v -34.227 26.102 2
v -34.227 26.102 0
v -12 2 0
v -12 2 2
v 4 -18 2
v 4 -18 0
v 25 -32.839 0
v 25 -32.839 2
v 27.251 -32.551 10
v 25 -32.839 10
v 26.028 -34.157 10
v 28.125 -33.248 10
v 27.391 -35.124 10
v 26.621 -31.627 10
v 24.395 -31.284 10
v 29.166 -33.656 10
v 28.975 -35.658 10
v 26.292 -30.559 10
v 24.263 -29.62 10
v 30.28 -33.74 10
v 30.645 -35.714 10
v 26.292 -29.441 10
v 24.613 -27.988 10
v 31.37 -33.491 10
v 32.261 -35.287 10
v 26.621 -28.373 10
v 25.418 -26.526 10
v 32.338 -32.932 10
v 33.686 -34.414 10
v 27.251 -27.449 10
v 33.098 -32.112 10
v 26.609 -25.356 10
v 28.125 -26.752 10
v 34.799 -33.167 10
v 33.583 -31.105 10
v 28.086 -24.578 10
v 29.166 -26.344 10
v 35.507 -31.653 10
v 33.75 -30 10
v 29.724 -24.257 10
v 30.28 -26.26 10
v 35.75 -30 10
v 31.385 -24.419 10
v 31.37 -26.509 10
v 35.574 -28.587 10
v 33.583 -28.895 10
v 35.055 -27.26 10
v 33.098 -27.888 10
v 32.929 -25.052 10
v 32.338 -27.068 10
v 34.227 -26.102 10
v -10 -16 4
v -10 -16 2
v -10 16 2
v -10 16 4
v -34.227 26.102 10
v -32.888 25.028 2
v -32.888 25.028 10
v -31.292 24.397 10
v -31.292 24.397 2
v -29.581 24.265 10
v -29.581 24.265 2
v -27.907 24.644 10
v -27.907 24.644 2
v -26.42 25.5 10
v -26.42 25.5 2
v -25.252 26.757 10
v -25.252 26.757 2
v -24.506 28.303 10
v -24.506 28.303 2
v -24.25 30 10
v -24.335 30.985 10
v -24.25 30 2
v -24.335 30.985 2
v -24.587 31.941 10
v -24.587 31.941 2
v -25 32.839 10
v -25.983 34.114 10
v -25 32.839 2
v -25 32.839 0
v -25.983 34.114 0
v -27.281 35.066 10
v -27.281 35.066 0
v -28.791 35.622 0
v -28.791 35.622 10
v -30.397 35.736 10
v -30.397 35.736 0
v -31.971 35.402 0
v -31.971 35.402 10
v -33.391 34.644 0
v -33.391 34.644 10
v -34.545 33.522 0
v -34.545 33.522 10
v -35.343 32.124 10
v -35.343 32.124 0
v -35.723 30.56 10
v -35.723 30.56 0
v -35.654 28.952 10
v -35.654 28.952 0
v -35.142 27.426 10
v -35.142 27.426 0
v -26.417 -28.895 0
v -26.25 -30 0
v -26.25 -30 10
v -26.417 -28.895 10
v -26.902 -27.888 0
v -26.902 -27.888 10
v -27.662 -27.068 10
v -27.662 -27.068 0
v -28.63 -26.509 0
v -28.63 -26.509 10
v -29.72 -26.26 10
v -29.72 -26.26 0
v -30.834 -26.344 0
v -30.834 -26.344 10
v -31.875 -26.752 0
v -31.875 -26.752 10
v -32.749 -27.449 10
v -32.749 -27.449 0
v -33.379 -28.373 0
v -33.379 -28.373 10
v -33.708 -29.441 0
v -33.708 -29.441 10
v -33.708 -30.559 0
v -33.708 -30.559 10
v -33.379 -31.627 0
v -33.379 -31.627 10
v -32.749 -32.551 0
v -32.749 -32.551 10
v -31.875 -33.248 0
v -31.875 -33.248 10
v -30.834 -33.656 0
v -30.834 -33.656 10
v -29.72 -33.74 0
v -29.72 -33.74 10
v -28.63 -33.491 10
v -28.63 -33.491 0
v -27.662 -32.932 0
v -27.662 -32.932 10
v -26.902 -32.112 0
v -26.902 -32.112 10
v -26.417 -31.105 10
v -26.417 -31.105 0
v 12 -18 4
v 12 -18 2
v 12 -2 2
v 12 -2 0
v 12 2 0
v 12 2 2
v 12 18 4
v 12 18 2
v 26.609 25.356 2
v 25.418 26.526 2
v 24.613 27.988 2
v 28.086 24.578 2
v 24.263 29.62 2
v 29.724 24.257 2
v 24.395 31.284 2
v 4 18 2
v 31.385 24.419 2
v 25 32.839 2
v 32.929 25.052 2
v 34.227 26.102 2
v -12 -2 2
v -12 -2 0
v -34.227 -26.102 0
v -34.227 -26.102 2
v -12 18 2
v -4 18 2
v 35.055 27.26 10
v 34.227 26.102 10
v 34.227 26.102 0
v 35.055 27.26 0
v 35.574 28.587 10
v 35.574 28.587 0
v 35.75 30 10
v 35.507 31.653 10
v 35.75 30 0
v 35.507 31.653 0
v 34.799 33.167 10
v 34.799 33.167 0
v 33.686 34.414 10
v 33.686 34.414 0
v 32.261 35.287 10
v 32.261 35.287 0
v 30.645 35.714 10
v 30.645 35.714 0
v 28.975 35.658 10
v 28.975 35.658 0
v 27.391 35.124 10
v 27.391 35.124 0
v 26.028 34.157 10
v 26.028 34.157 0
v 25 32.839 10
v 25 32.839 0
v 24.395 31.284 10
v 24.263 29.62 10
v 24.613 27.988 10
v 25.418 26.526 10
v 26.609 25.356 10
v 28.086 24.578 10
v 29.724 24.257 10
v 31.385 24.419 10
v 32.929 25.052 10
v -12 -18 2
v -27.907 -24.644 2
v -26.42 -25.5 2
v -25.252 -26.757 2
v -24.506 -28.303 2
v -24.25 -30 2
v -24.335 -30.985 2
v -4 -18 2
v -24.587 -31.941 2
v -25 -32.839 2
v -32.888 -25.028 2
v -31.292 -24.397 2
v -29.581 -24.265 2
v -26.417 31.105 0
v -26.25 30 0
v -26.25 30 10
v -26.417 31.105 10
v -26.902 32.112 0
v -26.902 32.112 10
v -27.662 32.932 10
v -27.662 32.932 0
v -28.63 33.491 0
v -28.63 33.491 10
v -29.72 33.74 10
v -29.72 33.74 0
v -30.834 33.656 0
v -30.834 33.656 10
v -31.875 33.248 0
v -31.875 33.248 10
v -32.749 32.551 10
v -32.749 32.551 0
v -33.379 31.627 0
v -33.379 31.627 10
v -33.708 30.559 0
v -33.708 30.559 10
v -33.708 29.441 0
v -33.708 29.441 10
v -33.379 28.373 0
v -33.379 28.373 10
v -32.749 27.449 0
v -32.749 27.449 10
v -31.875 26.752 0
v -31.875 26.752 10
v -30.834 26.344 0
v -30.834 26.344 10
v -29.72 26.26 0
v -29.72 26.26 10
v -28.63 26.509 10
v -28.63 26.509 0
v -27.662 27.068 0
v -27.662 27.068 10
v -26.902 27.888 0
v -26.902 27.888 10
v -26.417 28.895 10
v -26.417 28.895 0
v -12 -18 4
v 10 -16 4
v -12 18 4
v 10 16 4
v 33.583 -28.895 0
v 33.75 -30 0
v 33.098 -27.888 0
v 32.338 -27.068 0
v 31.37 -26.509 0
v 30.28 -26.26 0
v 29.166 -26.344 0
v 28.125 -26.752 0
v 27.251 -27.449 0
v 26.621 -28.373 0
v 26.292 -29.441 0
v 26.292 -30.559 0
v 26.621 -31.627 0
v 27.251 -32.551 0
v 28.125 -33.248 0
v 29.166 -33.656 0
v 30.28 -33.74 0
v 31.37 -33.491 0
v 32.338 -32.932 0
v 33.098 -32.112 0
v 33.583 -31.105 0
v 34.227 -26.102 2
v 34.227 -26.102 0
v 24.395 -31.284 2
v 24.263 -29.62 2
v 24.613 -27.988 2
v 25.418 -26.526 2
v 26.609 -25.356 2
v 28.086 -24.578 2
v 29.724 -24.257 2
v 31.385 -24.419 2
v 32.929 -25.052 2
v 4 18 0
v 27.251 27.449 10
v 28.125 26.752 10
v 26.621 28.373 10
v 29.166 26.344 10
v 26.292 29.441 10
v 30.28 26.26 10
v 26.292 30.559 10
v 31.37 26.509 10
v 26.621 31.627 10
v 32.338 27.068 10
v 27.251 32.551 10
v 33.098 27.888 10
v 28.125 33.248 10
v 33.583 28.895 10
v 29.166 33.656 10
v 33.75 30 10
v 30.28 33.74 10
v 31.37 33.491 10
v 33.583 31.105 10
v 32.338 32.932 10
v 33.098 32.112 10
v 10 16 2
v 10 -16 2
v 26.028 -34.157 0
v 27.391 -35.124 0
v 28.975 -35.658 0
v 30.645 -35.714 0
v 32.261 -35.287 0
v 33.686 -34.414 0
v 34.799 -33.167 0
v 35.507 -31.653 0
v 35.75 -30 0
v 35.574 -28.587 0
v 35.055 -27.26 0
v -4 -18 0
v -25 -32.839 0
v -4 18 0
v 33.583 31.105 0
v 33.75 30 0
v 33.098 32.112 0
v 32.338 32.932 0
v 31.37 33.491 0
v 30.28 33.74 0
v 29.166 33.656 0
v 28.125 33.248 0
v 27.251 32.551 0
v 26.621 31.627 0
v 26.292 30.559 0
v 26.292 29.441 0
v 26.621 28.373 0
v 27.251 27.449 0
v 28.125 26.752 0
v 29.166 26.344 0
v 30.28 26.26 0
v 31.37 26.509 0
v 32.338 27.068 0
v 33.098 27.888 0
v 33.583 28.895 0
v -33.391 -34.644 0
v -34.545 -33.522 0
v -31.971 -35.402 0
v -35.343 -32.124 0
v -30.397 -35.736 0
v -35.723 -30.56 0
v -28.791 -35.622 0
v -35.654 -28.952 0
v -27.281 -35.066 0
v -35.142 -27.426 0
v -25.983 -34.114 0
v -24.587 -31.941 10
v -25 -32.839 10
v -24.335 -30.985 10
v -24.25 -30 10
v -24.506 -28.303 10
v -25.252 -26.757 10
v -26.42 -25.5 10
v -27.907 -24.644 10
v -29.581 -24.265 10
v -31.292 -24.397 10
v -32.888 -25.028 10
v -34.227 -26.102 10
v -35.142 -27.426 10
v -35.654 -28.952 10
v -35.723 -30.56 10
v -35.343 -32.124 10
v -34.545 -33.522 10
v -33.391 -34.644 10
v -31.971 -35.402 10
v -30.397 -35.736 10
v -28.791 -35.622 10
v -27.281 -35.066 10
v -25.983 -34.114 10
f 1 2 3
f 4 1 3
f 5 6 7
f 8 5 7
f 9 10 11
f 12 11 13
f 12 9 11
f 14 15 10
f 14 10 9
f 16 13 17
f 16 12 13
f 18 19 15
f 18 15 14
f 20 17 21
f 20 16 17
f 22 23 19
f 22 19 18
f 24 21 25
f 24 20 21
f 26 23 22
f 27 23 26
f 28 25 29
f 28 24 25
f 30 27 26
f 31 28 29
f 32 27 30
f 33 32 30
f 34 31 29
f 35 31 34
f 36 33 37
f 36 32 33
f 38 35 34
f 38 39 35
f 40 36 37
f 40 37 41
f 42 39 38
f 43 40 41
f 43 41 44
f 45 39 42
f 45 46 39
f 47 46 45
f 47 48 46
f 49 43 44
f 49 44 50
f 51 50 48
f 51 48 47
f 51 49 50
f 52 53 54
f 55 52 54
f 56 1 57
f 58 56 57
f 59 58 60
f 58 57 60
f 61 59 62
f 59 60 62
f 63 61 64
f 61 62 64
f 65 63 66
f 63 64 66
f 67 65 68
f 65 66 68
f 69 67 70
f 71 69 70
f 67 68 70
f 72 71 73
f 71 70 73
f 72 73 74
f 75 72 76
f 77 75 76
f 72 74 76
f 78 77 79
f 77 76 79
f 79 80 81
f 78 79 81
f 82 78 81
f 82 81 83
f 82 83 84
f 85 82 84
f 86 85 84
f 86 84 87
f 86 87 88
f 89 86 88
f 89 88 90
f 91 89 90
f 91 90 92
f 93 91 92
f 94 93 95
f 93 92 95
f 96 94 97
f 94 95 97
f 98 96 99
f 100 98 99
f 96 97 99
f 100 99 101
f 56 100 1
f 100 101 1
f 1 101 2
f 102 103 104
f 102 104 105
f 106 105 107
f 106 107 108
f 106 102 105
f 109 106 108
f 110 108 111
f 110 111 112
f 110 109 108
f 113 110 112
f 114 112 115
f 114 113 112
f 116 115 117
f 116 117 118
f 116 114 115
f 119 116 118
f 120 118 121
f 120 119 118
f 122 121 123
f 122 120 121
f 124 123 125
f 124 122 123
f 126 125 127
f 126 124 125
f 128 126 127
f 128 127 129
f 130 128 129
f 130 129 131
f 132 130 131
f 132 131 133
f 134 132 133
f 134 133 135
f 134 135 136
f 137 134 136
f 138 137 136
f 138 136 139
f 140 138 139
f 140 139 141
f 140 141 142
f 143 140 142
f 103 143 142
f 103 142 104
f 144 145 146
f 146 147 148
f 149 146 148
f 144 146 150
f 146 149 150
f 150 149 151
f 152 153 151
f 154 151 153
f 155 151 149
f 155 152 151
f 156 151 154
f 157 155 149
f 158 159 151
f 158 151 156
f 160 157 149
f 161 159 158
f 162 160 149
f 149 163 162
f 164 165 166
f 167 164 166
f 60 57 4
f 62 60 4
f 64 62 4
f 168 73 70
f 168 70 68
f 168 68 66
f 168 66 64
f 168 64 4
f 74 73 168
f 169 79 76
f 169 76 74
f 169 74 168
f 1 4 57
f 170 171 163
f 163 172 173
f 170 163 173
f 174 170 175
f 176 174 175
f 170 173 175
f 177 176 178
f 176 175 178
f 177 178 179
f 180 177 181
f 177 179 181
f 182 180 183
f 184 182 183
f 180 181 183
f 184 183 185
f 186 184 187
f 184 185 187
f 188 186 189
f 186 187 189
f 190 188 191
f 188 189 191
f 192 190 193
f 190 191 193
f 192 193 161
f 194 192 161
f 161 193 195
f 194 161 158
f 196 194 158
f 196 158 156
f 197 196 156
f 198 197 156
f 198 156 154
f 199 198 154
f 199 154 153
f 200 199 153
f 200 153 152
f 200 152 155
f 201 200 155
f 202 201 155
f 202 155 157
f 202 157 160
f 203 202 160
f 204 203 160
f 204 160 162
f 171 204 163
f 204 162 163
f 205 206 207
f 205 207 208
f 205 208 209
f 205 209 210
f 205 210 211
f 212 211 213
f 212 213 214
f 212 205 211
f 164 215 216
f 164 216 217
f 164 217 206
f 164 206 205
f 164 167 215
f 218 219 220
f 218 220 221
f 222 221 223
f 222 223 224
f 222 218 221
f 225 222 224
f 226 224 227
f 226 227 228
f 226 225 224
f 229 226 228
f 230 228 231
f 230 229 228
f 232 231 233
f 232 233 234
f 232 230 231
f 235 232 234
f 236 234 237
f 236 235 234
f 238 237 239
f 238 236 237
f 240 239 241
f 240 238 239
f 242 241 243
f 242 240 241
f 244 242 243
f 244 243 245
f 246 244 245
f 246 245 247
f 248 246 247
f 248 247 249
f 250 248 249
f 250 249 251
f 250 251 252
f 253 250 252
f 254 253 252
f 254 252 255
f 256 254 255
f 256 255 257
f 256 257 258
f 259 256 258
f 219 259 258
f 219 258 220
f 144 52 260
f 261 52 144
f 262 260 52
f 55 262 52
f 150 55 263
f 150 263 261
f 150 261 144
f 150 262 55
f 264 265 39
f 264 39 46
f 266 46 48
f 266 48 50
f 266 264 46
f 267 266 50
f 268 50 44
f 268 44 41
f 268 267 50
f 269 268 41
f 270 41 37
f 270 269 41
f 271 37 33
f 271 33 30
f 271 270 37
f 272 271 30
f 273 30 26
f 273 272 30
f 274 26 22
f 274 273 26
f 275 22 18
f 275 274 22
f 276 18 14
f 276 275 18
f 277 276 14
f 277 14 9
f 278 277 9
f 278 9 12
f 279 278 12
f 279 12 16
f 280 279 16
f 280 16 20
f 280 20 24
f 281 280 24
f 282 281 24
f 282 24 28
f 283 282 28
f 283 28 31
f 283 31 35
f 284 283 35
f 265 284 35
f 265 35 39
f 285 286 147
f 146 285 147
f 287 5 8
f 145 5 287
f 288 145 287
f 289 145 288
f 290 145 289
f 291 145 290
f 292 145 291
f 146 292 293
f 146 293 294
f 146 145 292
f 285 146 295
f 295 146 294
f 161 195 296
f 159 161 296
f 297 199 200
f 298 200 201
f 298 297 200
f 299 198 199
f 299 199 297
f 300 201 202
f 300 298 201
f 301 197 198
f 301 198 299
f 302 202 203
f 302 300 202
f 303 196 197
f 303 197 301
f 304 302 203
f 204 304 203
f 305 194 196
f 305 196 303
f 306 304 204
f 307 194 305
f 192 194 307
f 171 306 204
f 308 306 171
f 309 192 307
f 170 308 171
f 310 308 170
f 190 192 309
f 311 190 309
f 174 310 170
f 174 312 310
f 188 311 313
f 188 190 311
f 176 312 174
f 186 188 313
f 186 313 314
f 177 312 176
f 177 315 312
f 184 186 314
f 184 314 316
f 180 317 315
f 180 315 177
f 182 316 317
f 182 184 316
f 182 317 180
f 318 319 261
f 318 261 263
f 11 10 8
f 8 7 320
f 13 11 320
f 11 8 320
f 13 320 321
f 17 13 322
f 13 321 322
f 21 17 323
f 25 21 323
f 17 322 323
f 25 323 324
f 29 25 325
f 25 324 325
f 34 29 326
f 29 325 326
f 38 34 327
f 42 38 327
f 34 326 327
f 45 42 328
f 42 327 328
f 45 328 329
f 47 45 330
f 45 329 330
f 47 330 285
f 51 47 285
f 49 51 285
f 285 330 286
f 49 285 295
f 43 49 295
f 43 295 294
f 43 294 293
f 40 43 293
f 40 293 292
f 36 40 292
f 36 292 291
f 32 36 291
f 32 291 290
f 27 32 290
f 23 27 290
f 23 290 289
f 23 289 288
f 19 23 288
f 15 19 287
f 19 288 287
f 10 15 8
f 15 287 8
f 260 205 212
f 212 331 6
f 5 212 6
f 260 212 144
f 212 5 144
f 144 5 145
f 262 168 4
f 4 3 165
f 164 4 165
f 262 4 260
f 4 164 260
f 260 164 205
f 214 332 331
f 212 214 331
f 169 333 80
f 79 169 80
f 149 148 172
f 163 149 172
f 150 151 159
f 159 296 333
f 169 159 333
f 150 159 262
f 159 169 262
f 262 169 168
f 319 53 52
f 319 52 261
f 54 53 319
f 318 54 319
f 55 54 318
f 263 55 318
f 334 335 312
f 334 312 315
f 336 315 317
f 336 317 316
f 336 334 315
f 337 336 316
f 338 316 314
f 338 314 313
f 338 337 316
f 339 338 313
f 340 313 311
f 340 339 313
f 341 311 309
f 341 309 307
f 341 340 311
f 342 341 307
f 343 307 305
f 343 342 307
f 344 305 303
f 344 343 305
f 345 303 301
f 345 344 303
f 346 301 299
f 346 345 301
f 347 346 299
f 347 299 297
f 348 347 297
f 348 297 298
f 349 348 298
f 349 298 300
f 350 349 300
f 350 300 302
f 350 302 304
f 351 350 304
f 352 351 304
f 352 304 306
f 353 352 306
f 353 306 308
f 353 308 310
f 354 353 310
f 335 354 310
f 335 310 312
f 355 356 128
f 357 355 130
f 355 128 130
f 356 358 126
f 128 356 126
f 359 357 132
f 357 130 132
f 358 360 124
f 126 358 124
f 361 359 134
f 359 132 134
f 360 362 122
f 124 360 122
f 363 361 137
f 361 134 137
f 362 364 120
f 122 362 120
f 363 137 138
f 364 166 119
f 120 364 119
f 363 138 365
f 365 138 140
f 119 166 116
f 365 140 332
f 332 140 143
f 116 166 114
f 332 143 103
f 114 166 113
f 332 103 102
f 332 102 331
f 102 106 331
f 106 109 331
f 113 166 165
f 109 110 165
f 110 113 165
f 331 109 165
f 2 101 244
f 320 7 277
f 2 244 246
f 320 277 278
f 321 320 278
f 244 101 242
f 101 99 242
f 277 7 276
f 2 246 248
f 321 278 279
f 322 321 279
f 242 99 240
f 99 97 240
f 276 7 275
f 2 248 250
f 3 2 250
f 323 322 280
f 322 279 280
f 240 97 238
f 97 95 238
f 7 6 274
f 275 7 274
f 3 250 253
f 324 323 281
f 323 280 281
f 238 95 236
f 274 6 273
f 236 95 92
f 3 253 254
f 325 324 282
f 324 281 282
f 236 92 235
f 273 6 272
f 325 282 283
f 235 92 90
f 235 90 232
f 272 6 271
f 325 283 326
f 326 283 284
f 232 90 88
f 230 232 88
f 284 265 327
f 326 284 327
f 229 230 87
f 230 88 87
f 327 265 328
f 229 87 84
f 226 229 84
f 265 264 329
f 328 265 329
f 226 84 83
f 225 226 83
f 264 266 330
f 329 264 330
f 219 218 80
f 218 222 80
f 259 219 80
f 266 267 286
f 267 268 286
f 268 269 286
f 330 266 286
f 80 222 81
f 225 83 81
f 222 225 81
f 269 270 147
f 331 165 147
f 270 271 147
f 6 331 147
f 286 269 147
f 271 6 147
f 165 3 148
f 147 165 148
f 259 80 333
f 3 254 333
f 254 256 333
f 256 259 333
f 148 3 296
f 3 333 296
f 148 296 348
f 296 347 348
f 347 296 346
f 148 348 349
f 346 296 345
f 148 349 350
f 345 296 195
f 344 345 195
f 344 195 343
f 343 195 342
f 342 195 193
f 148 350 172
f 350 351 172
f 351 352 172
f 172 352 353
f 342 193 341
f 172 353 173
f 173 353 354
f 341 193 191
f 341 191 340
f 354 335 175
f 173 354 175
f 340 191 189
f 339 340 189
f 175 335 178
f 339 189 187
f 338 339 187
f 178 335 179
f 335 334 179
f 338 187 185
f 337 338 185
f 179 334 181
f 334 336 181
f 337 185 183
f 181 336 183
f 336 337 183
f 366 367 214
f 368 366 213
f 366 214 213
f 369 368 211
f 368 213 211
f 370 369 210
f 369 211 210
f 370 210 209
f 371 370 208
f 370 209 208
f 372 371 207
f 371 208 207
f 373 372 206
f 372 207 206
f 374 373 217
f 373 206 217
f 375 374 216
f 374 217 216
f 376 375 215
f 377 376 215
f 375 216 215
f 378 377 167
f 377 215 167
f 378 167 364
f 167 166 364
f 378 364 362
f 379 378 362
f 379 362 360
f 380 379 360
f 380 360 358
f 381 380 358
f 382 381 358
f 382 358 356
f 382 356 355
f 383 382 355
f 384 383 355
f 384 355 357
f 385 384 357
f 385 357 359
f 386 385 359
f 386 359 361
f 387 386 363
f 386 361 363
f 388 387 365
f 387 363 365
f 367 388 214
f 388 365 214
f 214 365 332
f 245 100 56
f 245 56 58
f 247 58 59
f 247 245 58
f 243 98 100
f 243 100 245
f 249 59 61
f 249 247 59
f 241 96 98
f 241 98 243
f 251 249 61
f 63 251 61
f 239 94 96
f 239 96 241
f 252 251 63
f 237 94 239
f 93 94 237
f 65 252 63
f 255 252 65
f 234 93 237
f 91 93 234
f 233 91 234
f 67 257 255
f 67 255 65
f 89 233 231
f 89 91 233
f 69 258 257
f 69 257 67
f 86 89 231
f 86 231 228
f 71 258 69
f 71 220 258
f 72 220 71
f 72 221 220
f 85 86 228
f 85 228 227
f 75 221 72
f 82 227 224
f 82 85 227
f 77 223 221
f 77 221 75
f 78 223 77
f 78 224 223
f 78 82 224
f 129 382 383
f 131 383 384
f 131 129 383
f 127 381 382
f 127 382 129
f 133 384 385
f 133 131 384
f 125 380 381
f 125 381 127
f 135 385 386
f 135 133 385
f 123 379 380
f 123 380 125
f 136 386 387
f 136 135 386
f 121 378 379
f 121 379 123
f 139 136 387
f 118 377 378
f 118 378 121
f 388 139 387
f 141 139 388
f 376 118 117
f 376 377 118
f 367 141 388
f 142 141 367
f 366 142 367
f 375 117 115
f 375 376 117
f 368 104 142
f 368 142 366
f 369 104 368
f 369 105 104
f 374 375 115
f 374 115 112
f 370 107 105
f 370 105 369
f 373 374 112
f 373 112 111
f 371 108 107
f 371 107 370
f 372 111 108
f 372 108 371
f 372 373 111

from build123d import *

# Parameters (mm, degrees)
F0_W     = 20
F0_H     = 32
F0_R     = 3.75
F1_DEPTH = 2
F2_DEPTH = 10
F4_DEPTH = 4


with BuildPart() as f1:
    # F0 (on Top) → F1 (new body)
    with BuildSketch(Plane.XY):
        Polygon((12, 18), (4, 18), (-4, 18), (-12, 18), (-12, 2), (-12, -2), (-12, -18), (-4, -18), (4, -18), (12, -18), (12, -2), (12, 2), align=None)
        Rectangle(F0_W, F0_H, mode=Mode.SUBTRACT)
        Rectangle(F0_W, F0_H)
        with BuildLine():
            Line((-12, 18), (-4, 18))
            Line((-4, 18), (-25, 32.8394541729))
            ThreePointArc((-25, 32.8394541729), (-24.4406610105, 31.4684175156), (-24.25, 30))
            ThreePointArc((-24.25, 30), (-27.9074485781, 24.6442807629), (-34.2269490597, 26.1018720331))
            Line((-34.2269490597, 26.1018720331), (-12, 2))
            Line((-12, 2), (-12, 18))
        make_face()
        with BuildLine():
            ThreePointArc((34.2269490597, 26.1018720331), (26.6091070185, 25.3562574589), (25, 32.8394541729))
            Line((25, 32.8394541729), (4, 18))
            Line((4, 18), (12, 18))
            Line((12, 18), (12, 2))
            Line((12, 2), (34.2269490597, 26.1018720331))
        make_face()
        with BuildLine():
            Line((-12, -18), (-12, -2))
            Line((-12, -2), (-34.2269490597, -26.1018720331))
            ThreePointArc((-34.2269490597, -26.1018720331), (-27.9074485781, -24.6442807629), (-24.25, -30))
            ThreePointArc((-24.25, -30), (-24.4406610105, -31.4684175156), (-25, -32.8394541729))
            Line((-25, -32.8394541729), (-4, -18))
            Line((-4, -18), (-12, -18))
        make_face()
        with BuildLine():
            Line((34.2269490597, -26.1018720331), (12, -2))
            Line((12, -2), (12, -18))
            Line((12, -18), (4, -18))
            Line((4, -18), (25, -32.8394541729))
            ThreePointArc((25, -32.8394541729), (26.6091070185, -25.3562574589), (34.2269490597, -26.1018720331))
        make_face()
        with BuildLine():
            ThreePointArc((-24.25, 30), (-24.4406610105, 31.4684175156), (-25, 32.8394541729))
            ThreePointArc((-25, 32.8394541729), (-33.3908929815, 34.6437425411), (-34.2269490597, 26.1018720331))
            ThreePointArc((-34.2269490597, 26.1018720331), (-27.9074485781, 24.6442807629), (-24.25, 30))
        make_face()
        with Locations((-30, 30)):
            Circle(F0_R, mode=Mode.SUBTRACT)
        with BuildLine():
            ThreePointArc((35.75, -30), (35.3557192371, -27.9074485781), (34.2269490597, -26.1018720331))
            ThreePointArc((34.2269490597, -26.1018720331), (26.6091070185, -25.3562574589), (25, -32.8394541729))
            ThreePointArc((25, -32.8394541729), (31.4684175156, -35.5593389895), (35.75, -30))
        make_face()
        with Locations((30, -30)):
            Circle(F0_R, mode=Mode.SUBTRACT)
        with BuildLine():
            ThreePointArc((34.2269490597, 26.1018720331), (35.3557192371, 27.9074485781), (35.75, 30))
            ThreePointArc((35.75, 30), (31.4684175156, 35.5593389895), (25, 32.8394541729))
            ThreePointArc((25, 32.8394541729), (26.6091070185, 25.3562574589), (34.2269490597, 26.1018720331))
        make_face()
        with Locations((30, 30)):
            Circle(F0_R, mode=Mode.SUBTRACT)
        with BuildLine():
            ThreePointArc((-24.25, -30), (-27.9074485781, -24.6442807629), (-34.2269490597, -26.1018720331))
            ThreePointArc((-34.2269490597, -26.1018720331), (-33.3908929815, -34.6437425411), (-25, -32.8394541729))
            ThreePointArc((-25, -32.8394541729), (-24.4406610105, -31.4684175156), (-24.25, -30))
        make_face()
        with Locations((-30, -30)):
            Circle(F0_R, mode=Mode.SUBTRACT)
    extrude(amount=F1_DEPTH)

    # F0 (on Top) → F2 (join)
    with BuildSketch(Plane.XY):
        with BuildLine():
            ThreePointArc((-24.25, -30), (-27.9074485781, -24.6442807629), (-34.2269490597, -26.1018720331))
            ThreePointArc((-34.2269490597, -26.1018720331), (-33.3908929815, -34.6437425411), (-25, -32.8394541729))
            ThreePointArc((-25, -32.8394541729), (-24.4406610105, -31.4684175156), (-24.25, -30))
        make_face()
        with Locations((-30, -30)):
            Circle(F0_R, mode=Mode.SUBTRACT)
        with BuildLine():
            ThreePointArc((35.75, -30), (35.3557192371, -27.9074485781), (34.2269490597, -26.1018720331))
            ThreePointArc((34.2269490597, -26.1018720331), (26.6091070185, -25.3562574589), (25, -32.8394541729))
            ThreePointArc((25, -32.8394541729), (31.4684175156, -35.5593389895), (35.75, -30))
        make_face()
        with Locations((30, -30)):
            Circle(F0_R, mode=Mode.SUBTRACT)
        with BuildLine():
            ThreePointArc((34.2269490597, 26.1018720331), (35.3557192371, 27.9074485781), (35.75, 30))
            ThreePointArc((35.75, 30), (31.4684175156, 35.5593389895), (25, 32.8394541729))
            ThreePointArc((25, 32.8394541729), (26.6091070185, 25.3562574589), (34.2269490597, 26.1018720331))
        make_face()
        with Locations((30, 30)):
            Circle(F0_R, mode=Mode.SUBTRACT)
        with BuildLine():
            ThreePointArc((-24.25, 30), (-24.4406610105, 31.4684175156), (-25, 32.8394541729))
            ThreePointArc((-25, 32.8394541729), (-33.3908929815, 34.6437425411), (-34.2269490597, 26.1018720331))
            ThreePointArc((-34.2269490597, 26.1018720331), (-27.9074485781, 24.6442807629), (-24.25, 30))
        make_face()
        with Locations((-30, 30)):
            Circle(F0_R, mode=Mode.SUBTRACT)
    extrude(amount=F2_DEPTH)

    # F0 (on Top) → F4 (join)
    with BuildSketch(Plane.XY):
        Polygon((12, 18), (4, 18), (-4, 18), (-12, 18), (-12, 2), (-12, -2), (-12, -18), (-4, -18), (4, -18), (12, -18), (12, -2), (12, 2), align=None)
        Rectangle(F0_W, F0_H, mode=Mode.SUBTRACT)
    extrude(amount=F4_DEPTH)


solid = f1.part
